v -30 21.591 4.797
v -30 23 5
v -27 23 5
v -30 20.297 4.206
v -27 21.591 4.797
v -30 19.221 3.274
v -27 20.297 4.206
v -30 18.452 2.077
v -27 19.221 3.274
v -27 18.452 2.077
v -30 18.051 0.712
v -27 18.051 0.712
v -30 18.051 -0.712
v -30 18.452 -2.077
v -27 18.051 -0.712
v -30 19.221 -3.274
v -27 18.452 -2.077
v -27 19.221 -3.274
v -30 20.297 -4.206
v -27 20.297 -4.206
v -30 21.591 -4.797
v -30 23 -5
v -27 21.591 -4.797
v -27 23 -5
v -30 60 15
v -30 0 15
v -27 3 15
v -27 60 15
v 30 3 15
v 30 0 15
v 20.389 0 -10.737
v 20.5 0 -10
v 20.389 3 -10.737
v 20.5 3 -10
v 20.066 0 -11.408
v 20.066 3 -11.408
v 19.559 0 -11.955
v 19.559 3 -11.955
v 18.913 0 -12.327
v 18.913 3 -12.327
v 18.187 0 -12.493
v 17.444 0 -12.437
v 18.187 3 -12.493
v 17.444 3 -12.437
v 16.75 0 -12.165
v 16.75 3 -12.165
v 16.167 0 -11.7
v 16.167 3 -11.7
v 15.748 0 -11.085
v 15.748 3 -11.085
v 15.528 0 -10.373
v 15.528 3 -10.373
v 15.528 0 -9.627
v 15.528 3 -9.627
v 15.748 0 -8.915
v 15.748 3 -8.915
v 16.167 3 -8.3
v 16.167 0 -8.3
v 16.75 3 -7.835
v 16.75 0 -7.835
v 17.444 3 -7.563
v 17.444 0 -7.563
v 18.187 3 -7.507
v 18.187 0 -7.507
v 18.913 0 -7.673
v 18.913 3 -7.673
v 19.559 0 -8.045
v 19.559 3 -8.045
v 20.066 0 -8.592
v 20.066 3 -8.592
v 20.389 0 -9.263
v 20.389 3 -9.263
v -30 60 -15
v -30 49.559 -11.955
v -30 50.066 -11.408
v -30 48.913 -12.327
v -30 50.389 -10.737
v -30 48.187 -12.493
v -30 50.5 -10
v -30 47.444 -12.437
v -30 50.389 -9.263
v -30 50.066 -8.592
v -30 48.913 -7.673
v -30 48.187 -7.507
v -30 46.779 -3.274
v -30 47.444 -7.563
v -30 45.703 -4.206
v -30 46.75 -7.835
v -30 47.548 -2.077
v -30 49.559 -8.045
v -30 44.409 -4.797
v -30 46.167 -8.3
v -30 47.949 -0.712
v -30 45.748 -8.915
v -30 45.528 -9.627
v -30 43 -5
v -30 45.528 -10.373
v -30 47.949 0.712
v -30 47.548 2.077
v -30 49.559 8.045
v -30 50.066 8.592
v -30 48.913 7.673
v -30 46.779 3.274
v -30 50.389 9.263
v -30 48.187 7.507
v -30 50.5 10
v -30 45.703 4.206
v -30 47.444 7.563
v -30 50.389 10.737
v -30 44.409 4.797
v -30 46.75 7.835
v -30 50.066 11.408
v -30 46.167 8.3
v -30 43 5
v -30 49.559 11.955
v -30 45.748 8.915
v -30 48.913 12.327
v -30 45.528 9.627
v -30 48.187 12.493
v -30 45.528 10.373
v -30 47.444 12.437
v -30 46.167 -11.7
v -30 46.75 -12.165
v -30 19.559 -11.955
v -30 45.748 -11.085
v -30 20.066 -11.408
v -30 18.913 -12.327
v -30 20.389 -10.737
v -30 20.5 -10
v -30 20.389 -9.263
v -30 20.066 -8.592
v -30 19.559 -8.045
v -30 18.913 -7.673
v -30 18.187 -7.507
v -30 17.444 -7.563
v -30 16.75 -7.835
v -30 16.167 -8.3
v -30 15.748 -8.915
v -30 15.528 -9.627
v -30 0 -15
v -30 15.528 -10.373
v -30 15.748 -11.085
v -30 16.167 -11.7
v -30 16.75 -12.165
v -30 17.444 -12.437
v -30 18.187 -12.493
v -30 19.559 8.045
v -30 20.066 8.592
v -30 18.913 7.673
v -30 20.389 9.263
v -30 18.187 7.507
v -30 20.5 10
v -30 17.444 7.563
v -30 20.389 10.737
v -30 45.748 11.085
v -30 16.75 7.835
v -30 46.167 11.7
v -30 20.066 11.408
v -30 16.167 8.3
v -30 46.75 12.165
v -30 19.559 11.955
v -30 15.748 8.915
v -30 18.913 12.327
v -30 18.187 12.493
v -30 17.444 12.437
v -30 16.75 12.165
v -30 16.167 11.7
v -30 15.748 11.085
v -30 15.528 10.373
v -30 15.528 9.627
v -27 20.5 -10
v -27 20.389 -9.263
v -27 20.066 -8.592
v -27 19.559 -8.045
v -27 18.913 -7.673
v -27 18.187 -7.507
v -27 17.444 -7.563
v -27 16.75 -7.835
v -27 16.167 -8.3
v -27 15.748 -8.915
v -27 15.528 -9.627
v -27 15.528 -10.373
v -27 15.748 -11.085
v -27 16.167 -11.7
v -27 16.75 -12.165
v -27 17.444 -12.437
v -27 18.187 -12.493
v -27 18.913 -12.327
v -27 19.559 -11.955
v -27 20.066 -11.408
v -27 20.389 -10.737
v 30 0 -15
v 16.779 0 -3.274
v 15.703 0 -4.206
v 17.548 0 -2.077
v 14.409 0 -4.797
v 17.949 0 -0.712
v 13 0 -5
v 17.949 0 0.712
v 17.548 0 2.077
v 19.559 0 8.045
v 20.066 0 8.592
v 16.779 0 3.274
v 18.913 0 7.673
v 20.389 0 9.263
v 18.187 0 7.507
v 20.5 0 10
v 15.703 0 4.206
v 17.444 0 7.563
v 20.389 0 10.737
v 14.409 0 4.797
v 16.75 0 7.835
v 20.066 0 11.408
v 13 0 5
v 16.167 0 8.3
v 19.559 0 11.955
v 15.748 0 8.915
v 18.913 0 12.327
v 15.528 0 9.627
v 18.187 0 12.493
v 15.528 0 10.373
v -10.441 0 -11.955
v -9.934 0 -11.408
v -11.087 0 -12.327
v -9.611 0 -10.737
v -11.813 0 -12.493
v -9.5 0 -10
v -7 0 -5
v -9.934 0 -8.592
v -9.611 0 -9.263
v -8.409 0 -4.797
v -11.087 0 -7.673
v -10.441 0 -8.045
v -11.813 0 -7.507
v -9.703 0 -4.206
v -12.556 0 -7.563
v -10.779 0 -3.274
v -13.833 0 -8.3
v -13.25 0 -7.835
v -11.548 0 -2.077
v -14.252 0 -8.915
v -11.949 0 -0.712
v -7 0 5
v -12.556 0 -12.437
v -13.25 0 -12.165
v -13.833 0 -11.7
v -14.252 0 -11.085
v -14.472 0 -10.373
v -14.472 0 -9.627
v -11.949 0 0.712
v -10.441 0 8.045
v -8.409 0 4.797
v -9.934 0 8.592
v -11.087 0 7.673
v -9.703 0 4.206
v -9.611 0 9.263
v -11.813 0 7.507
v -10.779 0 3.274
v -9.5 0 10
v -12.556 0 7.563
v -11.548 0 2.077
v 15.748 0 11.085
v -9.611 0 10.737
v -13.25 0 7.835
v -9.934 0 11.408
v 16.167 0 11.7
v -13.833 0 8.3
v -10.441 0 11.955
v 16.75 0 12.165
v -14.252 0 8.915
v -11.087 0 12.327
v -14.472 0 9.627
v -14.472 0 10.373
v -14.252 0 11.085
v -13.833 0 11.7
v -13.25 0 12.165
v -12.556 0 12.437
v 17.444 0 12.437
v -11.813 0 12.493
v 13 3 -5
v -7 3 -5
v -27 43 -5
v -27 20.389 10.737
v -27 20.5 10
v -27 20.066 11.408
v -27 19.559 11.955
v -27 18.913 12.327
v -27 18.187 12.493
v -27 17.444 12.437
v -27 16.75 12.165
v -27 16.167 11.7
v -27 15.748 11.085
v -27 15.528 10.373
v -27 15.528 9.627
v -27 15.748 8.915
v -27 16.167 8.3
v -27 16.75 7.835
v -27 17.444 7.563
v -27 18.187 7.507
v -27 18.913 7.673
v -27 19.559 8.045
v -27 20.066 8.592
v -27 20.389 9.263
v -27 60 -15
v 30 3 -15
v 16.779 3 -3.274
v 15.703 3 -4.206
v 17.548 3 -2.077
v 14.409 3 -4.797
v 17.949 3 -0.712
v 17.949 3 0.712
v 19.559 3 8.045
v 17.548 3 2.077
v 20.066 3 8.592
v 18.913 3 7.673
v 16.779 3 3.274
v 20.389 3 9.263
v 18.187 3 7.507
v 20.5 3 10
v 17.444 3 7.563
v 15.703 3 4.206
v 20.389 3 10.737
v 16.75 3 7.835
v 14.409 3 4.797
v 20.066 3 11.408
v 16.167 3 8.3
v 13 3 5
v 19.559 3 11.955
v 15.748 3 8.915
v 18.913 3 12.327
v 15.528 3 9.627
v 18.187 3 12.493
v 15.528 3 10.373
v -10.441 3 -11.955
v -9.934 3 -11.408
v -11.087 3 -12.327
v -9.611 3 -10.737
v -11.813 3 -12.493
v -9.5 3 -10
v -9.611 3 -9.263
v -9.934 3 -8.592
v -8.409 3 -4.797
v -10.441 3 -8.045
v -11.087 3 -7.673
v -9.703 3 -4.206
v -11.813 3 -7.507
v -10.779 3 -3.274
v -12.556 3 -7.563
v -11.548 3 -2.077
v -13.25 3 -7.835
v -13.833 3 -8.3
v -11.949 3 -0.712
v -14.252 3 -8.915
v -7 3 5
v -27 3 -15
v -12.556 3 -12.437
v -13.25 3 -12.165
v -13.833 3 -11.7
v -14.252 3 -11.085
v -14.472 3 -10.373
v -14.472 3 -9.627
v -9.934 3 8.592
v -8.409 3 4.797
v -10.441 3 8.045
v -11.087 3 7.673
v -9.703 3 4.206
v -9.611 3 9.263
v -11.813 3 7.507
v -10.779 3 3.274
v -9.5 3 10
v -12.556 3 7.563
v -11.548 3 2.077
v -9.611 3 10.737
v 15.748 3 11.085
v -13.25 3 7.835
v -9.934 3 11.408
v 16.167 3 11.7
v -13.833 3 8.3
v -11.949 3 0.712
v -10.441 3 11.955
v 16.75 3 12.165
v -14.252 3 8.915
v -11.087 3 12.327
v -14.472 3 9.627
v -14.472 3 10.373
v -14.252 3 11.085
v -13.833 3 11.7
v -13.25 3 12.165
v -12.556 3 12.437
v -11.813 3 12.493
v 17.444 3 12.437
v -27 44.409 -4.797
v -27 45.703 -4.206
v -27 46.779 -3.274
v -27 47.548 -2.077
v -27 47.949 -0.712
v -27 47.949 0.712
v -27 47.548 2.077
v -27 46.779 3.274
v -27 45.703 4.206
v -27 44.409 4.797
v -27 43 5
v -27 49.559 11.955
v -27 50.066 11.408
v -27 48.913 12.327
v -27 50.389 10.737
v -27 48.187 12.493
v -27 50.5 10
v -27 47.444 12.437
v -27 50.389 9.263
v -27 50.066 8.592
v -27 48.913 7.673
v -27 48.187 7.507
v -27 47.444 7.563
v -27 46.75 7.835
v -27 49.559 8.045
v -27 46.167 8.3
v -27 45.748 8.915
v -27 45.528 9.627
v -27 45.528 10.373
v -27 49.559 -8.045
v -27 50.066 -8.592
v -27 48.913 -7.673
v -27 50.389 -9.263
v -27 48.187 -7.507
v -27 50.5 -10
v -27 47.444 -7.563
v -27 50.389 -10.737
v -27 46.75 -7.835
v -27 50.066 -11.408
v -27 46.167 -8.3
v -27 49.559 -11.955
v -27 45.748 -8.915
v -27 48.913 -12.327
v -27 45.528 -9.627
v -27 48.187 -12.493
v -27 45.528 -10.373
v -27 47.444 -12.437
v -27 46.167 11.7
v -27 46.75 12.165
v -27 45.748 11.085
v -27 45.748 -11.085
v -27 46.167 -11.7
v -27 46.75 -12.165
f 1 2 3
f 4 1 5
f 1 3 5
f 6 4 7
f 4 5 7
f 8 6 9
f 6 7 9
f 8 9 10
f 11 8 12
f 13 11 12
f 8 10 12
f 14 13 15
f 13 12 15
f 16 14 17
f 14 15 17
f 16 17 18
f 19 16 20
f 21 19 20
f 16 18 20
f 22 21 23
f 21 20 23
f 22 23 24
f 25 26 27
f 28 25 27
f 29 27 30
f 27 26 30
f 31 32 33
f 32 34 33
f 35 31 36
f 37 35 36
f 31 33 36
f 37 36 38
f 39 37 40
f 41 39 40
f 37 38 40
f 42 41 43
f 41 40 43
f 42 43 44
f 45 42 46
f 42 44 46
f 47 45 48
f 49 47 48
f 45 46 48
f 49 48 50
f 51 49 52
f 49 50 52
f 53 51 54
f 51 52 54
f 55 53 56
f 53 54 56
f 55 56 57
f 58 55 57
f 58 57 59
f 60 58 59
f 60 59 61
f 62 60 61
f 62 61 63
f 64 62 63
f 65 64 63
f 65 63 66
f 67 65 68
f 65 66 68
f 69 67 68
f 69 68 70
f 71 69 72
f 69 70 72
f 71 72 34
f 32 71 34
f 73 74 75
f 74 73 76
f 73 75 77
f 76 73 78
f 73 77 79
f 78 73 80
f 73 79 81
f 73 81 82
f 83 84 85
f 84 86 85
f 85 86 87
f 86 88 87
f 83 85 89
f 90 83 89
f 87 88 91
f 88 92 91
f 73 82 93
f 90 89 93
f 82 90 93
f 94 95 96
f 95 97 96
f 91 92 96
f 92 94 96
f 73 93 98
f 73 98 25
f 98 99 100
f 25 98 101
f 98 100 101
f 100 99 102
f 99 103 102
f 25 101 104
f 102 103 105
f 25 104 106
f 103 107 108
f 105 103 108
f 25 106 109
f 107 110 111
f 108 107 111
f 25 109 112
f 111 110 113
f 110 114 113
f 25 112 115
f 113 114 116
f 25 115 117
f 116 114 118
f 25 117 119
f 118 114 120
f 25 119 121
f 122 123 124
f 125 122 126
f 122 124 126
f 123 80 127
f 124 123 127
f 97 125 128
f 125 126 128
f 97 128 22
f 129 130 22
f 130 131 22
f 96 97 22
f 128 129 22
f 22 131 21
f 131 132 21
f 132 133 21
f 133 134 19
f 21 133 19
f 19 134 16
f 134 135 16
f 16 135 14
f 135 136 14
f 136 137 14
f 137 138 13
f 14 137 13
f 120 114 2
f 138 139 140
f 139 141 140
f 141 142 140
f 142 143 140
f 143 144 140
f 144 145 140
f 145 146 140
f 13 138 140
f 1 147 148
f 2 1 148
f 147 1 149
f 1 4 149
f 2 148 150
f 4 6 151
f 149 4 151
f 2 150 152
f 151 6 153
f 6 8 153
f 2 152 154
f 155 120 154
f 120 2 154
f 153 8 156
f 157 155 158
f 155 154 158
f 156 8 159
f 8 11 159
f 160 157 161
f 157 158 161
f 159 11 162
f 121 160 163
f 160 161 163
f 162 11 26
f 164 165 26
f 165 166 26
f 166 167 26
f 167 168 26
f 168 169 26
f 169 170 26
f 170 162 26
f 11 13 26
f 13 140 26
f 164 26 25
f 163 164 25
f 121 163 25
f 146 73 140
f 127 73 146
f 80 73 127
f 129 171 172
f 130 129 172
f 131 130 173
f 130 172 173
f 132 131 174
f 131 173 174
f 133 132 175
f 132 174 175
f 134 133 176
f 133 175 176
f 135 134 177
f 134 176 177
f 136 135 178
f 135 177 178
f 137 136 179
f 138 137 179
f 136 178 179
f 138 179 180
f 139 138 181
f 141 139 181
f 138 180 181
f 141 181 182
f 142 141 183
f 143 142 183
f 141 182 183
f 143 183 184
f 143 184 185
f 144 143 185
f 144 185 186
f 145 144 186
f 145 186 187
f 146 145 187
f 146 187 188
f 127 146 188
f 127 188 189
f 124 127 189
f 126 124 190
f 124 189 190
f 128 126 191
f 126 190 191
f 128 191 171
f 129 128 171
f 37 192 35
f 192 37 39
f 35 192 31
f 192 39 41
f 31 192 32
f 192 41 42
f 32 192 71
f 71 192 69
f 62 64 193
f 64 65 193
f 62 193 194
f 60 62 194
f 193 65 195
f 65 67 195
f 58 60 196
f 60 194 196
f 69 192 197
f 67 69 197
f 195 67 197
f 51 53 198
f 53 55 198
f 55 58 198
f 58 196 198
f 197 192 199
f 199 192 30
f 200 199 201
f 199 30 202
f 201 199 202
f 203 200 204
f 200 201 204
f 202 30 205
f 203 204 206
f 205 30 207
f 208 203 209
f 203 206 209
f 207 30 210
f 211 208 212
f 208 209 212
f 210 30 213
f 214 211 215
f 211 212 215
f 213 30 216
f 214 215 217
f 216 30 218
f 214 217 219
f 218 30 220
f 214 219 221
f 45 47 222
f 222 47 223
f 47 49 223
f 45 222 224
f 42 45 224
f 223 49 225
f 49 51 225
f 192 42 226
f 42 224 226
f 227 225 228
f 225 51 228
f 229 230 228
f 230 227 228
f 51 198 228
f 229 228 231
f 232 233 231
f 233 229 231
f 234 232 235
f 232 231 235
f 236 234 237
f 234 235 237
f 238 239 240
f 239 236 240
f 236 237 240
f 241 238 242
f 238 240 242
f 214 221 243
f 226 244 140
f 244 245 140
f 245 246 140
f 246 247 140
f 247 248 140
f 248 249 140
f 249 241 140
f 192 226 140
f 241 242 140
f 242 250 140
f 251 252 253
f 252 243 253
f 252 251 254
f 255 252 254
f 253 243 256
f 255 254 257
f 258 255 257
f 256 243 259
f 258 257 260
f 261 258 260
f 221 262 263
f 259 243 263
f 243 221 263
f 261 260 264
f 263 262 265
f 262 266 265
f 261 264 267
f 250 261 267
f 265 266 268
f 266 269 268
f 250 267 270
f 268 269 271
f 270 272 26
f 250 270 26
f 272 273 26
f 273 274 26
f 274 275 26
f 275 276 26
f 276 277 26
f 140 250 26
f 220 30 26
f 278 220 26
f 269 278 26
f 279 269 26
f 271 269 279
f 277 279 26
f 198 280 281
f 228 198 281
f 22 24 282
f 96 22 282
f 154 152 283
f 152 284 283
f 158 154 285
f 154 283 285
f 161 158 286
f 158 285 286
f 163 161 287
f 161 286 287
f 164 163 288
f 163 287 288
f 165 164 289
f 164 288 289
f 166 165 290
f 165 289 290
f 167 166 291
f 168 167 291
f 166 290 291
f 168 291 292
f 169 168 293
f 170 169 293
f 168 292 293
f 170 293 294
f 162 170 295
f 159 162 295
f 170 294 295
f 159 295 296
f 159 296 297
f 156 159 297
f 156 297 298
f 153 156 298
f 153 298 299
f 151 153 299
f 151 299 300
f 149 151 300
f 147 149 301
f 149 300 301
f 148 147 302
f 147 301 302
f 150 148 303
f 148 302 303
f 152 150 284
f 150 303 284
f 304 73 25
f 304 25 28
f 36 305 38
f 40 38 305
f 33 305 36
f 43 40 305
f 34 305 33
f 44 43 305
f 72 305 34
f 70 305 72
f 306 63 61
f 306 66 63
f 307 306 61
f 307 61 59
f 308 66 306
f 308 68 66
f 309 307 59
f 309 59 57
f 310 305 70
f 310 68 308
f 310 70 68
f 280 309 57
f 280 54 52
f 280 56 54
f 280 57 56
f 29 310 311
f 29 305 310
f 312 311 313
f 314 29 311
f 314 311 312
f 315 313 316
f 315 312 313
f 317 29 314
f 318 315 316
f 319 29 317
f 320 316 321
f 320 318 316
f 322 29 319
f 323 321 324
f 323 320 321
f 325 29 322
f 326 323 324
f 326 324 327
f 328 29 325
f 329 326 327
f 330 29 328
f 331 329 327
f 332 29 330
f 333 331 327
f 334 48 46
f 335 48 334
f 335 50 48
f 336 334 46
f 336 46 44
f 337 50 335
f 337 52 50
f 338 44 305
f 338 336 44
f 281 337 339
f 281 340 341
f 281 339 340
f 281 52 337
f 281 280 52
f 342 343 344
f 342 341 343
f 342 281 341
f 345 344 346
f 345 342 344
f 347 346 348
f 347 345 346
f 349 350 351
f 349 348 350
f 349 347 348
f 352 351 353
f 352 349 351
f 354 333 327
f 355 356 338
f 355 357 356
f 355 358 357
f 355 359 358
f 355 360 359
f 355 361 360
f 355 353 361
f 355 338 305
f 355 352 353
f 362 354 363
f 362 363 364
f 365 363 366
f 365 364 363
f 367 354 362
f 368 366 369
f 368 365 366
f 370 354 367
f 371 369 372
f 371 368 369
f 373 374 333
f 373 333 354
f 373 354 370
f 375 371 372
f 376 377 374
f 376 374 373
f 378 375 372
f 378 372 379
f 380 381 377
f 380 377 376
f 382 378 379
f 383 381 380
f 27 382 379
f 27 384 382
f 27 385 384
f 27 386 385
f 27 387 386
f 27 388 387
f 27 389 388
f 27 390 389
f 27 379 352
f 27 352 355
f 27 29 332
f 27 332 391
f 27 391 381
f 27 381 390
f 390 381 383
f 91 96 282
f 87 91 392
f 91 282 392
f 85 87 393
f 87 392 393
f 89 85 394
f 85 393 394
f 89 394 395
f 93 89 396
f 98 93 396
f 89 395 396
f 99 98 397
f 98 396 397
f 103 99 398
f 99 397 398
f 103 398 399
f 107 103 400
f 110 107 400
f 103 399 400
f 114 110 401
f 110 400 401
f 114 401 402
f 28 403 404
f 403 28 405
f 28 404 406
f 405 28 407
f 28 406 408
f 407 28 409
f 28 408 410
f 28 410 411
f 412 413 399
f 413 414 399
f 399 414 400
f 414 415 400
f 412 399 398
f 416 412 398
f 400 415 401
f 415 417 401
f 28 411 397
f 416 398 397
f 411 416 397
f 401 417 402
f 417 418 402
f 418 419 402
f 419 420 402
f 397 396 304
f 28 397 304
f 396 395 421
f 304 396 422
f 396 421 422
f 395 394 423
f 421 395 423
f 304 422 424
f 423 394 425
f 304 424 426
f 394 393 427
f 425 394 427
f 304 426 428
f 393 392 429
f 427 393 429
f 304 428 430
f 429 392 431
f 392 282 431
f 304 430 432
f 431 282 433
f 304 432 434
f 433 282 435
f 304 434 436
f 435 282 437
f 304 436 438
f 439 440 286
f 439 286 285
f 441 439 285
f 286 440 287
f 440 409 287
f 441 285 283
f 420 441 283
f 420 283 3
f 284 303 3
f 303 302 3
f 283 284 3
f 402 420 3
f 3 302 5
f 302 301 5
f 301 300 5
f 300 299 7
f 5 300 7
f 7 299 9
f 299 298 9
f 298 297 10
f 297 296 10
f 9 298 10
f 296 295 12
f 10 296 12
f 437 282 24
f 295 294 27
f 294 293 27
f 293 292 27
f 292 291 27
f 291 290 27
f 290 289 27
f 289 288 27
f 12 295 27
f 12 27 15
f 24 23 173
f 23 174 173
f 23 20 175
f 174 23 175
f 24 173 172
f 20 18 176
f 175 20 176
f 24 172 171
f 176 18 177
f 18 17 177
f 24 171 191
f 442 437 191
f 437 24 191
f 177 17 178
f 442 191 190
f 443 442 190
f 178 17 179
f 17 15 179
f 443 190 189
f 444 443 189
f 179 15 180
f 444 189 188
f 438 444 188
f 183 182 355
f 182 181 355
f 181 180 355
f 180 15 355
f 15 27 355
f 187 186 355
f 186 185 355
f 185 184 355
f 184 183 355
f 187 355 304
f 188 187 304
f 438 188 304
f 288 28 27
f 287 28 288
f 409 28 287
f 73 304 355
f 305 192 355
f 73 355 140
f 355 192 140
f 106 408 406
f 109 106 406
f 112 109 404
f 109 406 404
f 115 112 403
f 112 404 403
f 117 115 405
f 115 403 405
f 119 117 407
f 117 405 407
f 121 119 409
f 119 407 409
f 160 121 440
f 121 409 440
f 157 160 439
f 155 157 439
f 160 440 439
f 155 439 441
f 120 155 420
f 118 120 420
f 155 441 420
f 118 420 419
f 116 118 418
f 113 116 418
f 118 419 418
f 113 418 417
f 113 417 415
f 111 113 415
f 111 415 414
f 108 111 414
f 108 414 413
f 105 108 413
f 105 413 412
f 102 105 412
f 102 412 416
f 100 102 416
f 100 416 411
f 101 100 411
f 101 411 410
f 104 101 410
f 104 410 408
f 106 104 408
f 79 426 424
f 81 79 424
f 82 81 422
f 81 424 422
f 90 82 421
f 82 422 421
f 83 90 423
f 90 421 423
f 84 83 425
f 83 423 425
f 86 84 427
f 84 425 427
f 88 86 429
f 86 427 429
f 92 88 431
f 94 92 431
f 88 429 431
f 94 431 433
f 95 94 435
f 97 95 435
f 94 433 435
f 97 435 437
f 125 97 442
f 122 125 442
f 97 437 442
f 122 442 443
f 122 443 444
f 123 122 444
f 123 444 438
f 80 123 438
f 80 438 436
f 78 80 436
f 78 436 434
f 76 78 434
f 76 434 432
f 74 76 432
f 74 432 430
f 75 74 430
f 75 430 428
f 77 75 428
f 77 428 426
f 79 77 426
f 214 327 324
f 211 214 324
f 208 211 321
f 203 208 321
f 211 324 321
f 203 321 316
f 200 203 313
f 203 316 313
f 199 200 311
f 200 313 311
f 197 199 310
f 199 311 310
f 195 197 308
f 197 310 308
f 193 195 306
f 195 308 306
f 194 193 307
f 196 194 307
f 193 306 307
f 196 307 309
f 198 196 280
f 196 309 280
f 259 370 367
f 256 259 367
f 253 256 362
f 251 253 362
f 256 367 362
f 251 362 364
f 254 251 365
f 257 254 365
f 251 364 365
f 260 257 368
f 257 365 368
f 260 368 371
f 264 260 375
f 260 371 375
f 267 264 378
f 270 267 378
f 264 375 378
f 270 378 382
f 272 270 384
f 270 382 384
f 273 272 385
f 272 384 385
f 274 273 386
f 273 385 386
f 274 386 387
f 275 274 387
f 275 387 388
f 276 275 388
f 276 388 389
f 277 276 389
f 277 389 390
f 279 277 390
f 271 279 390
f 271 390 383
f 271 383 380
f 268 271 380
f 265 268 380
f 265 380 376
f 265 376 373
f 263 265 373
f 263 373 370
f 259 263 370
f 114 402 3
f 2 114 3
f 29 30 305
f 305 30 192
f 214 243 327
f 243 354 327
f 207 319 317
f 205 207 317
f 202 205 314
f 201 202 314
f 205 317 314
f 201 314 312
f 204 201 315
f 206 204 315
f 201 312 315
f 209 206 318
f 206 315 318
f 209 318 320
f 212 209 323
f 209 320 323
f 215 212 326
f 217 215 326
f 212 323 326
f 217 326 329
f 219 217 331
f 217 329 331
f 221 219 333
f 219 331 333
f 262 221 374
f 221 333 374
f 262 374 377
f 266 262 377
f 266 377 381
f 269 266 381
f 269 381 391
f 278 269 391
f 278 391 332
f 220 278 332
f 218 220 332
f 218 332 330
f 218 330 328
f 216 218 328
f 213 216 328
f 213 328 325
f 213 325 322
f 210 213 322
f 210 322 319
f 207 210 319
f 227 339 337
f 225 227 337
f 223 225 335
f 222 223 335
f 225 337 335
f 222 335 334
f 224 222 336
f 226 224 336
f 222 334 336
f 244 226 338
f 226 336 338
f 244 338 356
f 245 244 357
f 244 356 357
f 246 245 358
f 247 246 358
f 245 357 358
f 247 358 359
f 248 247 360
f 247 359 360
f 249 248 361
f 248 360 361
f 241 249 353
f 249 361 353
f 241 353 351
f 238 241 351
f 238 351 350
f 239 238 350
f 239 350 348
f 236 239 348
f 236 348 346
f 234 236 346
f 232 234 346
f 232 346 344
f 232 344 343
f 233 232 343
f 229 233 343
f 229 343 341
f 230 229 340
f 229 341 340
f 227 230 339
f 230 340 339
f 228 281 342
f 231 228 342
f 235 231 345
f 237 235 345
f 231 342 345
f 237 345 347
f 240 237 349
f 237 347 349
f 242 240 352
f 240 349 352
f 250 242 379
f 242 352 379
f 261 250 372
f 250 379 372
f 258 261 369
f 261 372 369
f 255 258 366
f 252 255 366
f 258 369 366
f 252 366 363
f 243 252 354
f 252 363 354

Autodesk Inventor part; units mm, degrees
ref_plane "YZ Plane" through (0, 0, 0) normal (1, 0, 0) x (0, 1, 0)
ref_plane "XZ Plane" through (0, 0, 0) normal (0, 1, 0) x (-1, 0, 0)
sketch "Sketch1" plane through (0, 0, 0) normal (0, 1, 0) x (-1, 0, 0)
  line L0 (-30, -15) -> (30, -15)
  line L1 (30, -15) -> (30, 15)
  line L2 (30, 15) -> (-30, 15)
  line L3 (-30, 15) -> (-30, -15)
  line L4 (-30, -15) -> (30, 15) construction
  line L5 (30, -15) -> (-30, 15) construction
  point P0 (0, 0)
  dimension "d0" = 60
  dimension "d1" = 30
extrude "Extrusion1" add sketch "Sketch1" along normal blind 3
sketch "Sketch2" plane through (0, 3, 0) normal (0, 1, 0) x (1, 0, 0)
  line L0 (-30, 15) -> (-30, -15) projected
  line L1 (30, 15) -> (-30, 15) projected
  line L2 (-30, -15) -> (-27, -15)
  line L3 (-27, -15) -> (-27, 15)
  line L4 (-27, 15) -> (-30, 15)
  line L5 (-30, 15) -> (-30, -15)
  point P0 (0, 0)
  dimension "d4" = 3
extrude "Extrusion2" add sketch "Sketch2" along normal blind 57
sketch "Sketch3" plane through (0, 3, 0) normal (0, 1, 0) x (1, 0, 0)
  line L0 (-7, 0) -> (13, 0) construction
  line L1 (-7, -5) -> (13, -5)
  line L2 (13, 5) -> (-7, 5)
  arc A0 (-7, 5) -> (-7, -5) centre (-7, 0) ccw
  arc A1 (13, -5) -> (13, 5) centre (13, 0) ccw
  line L3 (3, 0) -> (23, 0) construction
  line L4 (-27, -15) -> (30, -15) projected
  line L5 (30, -15) -> (30, 15) projected
  circle A2 centre (18, -10) radius 2.5
  point P0 (18, 0)
  dimension "d7" = 10
  dimension "d8" = 0
  dimension "d9" = 10
  dimension "d10" = 5
  dimension "d11" = 12
  dimension "d12" = 5
  dimension "d23" = 0
extrude "Extrusion3" cut sketch "Sketch3" against normal through all contours A2
pattern_linear "Rectangular Pattern1" count 2 spacing 30 along (-1, 0, 0) count 2 spacing 20 along (0, 0, -1) of "Extrusion3"
extrude "Extrusion4" cut sketch "Sketch3" against normal through all contours A0 L2 A1 L1
ref_plane "Work Plane1" through (-27, 3, 0) normal (-0.7071, 0.7071, 0) x (0, 0, 1)
mirror "Mirror1" about plane through (-27, 3, 0) normal (-0.7071, 0.7071, 0) of "Extrusion3", "Rectangular Pattern1", "Extrusion4"
properties part number "L_Bracket"
